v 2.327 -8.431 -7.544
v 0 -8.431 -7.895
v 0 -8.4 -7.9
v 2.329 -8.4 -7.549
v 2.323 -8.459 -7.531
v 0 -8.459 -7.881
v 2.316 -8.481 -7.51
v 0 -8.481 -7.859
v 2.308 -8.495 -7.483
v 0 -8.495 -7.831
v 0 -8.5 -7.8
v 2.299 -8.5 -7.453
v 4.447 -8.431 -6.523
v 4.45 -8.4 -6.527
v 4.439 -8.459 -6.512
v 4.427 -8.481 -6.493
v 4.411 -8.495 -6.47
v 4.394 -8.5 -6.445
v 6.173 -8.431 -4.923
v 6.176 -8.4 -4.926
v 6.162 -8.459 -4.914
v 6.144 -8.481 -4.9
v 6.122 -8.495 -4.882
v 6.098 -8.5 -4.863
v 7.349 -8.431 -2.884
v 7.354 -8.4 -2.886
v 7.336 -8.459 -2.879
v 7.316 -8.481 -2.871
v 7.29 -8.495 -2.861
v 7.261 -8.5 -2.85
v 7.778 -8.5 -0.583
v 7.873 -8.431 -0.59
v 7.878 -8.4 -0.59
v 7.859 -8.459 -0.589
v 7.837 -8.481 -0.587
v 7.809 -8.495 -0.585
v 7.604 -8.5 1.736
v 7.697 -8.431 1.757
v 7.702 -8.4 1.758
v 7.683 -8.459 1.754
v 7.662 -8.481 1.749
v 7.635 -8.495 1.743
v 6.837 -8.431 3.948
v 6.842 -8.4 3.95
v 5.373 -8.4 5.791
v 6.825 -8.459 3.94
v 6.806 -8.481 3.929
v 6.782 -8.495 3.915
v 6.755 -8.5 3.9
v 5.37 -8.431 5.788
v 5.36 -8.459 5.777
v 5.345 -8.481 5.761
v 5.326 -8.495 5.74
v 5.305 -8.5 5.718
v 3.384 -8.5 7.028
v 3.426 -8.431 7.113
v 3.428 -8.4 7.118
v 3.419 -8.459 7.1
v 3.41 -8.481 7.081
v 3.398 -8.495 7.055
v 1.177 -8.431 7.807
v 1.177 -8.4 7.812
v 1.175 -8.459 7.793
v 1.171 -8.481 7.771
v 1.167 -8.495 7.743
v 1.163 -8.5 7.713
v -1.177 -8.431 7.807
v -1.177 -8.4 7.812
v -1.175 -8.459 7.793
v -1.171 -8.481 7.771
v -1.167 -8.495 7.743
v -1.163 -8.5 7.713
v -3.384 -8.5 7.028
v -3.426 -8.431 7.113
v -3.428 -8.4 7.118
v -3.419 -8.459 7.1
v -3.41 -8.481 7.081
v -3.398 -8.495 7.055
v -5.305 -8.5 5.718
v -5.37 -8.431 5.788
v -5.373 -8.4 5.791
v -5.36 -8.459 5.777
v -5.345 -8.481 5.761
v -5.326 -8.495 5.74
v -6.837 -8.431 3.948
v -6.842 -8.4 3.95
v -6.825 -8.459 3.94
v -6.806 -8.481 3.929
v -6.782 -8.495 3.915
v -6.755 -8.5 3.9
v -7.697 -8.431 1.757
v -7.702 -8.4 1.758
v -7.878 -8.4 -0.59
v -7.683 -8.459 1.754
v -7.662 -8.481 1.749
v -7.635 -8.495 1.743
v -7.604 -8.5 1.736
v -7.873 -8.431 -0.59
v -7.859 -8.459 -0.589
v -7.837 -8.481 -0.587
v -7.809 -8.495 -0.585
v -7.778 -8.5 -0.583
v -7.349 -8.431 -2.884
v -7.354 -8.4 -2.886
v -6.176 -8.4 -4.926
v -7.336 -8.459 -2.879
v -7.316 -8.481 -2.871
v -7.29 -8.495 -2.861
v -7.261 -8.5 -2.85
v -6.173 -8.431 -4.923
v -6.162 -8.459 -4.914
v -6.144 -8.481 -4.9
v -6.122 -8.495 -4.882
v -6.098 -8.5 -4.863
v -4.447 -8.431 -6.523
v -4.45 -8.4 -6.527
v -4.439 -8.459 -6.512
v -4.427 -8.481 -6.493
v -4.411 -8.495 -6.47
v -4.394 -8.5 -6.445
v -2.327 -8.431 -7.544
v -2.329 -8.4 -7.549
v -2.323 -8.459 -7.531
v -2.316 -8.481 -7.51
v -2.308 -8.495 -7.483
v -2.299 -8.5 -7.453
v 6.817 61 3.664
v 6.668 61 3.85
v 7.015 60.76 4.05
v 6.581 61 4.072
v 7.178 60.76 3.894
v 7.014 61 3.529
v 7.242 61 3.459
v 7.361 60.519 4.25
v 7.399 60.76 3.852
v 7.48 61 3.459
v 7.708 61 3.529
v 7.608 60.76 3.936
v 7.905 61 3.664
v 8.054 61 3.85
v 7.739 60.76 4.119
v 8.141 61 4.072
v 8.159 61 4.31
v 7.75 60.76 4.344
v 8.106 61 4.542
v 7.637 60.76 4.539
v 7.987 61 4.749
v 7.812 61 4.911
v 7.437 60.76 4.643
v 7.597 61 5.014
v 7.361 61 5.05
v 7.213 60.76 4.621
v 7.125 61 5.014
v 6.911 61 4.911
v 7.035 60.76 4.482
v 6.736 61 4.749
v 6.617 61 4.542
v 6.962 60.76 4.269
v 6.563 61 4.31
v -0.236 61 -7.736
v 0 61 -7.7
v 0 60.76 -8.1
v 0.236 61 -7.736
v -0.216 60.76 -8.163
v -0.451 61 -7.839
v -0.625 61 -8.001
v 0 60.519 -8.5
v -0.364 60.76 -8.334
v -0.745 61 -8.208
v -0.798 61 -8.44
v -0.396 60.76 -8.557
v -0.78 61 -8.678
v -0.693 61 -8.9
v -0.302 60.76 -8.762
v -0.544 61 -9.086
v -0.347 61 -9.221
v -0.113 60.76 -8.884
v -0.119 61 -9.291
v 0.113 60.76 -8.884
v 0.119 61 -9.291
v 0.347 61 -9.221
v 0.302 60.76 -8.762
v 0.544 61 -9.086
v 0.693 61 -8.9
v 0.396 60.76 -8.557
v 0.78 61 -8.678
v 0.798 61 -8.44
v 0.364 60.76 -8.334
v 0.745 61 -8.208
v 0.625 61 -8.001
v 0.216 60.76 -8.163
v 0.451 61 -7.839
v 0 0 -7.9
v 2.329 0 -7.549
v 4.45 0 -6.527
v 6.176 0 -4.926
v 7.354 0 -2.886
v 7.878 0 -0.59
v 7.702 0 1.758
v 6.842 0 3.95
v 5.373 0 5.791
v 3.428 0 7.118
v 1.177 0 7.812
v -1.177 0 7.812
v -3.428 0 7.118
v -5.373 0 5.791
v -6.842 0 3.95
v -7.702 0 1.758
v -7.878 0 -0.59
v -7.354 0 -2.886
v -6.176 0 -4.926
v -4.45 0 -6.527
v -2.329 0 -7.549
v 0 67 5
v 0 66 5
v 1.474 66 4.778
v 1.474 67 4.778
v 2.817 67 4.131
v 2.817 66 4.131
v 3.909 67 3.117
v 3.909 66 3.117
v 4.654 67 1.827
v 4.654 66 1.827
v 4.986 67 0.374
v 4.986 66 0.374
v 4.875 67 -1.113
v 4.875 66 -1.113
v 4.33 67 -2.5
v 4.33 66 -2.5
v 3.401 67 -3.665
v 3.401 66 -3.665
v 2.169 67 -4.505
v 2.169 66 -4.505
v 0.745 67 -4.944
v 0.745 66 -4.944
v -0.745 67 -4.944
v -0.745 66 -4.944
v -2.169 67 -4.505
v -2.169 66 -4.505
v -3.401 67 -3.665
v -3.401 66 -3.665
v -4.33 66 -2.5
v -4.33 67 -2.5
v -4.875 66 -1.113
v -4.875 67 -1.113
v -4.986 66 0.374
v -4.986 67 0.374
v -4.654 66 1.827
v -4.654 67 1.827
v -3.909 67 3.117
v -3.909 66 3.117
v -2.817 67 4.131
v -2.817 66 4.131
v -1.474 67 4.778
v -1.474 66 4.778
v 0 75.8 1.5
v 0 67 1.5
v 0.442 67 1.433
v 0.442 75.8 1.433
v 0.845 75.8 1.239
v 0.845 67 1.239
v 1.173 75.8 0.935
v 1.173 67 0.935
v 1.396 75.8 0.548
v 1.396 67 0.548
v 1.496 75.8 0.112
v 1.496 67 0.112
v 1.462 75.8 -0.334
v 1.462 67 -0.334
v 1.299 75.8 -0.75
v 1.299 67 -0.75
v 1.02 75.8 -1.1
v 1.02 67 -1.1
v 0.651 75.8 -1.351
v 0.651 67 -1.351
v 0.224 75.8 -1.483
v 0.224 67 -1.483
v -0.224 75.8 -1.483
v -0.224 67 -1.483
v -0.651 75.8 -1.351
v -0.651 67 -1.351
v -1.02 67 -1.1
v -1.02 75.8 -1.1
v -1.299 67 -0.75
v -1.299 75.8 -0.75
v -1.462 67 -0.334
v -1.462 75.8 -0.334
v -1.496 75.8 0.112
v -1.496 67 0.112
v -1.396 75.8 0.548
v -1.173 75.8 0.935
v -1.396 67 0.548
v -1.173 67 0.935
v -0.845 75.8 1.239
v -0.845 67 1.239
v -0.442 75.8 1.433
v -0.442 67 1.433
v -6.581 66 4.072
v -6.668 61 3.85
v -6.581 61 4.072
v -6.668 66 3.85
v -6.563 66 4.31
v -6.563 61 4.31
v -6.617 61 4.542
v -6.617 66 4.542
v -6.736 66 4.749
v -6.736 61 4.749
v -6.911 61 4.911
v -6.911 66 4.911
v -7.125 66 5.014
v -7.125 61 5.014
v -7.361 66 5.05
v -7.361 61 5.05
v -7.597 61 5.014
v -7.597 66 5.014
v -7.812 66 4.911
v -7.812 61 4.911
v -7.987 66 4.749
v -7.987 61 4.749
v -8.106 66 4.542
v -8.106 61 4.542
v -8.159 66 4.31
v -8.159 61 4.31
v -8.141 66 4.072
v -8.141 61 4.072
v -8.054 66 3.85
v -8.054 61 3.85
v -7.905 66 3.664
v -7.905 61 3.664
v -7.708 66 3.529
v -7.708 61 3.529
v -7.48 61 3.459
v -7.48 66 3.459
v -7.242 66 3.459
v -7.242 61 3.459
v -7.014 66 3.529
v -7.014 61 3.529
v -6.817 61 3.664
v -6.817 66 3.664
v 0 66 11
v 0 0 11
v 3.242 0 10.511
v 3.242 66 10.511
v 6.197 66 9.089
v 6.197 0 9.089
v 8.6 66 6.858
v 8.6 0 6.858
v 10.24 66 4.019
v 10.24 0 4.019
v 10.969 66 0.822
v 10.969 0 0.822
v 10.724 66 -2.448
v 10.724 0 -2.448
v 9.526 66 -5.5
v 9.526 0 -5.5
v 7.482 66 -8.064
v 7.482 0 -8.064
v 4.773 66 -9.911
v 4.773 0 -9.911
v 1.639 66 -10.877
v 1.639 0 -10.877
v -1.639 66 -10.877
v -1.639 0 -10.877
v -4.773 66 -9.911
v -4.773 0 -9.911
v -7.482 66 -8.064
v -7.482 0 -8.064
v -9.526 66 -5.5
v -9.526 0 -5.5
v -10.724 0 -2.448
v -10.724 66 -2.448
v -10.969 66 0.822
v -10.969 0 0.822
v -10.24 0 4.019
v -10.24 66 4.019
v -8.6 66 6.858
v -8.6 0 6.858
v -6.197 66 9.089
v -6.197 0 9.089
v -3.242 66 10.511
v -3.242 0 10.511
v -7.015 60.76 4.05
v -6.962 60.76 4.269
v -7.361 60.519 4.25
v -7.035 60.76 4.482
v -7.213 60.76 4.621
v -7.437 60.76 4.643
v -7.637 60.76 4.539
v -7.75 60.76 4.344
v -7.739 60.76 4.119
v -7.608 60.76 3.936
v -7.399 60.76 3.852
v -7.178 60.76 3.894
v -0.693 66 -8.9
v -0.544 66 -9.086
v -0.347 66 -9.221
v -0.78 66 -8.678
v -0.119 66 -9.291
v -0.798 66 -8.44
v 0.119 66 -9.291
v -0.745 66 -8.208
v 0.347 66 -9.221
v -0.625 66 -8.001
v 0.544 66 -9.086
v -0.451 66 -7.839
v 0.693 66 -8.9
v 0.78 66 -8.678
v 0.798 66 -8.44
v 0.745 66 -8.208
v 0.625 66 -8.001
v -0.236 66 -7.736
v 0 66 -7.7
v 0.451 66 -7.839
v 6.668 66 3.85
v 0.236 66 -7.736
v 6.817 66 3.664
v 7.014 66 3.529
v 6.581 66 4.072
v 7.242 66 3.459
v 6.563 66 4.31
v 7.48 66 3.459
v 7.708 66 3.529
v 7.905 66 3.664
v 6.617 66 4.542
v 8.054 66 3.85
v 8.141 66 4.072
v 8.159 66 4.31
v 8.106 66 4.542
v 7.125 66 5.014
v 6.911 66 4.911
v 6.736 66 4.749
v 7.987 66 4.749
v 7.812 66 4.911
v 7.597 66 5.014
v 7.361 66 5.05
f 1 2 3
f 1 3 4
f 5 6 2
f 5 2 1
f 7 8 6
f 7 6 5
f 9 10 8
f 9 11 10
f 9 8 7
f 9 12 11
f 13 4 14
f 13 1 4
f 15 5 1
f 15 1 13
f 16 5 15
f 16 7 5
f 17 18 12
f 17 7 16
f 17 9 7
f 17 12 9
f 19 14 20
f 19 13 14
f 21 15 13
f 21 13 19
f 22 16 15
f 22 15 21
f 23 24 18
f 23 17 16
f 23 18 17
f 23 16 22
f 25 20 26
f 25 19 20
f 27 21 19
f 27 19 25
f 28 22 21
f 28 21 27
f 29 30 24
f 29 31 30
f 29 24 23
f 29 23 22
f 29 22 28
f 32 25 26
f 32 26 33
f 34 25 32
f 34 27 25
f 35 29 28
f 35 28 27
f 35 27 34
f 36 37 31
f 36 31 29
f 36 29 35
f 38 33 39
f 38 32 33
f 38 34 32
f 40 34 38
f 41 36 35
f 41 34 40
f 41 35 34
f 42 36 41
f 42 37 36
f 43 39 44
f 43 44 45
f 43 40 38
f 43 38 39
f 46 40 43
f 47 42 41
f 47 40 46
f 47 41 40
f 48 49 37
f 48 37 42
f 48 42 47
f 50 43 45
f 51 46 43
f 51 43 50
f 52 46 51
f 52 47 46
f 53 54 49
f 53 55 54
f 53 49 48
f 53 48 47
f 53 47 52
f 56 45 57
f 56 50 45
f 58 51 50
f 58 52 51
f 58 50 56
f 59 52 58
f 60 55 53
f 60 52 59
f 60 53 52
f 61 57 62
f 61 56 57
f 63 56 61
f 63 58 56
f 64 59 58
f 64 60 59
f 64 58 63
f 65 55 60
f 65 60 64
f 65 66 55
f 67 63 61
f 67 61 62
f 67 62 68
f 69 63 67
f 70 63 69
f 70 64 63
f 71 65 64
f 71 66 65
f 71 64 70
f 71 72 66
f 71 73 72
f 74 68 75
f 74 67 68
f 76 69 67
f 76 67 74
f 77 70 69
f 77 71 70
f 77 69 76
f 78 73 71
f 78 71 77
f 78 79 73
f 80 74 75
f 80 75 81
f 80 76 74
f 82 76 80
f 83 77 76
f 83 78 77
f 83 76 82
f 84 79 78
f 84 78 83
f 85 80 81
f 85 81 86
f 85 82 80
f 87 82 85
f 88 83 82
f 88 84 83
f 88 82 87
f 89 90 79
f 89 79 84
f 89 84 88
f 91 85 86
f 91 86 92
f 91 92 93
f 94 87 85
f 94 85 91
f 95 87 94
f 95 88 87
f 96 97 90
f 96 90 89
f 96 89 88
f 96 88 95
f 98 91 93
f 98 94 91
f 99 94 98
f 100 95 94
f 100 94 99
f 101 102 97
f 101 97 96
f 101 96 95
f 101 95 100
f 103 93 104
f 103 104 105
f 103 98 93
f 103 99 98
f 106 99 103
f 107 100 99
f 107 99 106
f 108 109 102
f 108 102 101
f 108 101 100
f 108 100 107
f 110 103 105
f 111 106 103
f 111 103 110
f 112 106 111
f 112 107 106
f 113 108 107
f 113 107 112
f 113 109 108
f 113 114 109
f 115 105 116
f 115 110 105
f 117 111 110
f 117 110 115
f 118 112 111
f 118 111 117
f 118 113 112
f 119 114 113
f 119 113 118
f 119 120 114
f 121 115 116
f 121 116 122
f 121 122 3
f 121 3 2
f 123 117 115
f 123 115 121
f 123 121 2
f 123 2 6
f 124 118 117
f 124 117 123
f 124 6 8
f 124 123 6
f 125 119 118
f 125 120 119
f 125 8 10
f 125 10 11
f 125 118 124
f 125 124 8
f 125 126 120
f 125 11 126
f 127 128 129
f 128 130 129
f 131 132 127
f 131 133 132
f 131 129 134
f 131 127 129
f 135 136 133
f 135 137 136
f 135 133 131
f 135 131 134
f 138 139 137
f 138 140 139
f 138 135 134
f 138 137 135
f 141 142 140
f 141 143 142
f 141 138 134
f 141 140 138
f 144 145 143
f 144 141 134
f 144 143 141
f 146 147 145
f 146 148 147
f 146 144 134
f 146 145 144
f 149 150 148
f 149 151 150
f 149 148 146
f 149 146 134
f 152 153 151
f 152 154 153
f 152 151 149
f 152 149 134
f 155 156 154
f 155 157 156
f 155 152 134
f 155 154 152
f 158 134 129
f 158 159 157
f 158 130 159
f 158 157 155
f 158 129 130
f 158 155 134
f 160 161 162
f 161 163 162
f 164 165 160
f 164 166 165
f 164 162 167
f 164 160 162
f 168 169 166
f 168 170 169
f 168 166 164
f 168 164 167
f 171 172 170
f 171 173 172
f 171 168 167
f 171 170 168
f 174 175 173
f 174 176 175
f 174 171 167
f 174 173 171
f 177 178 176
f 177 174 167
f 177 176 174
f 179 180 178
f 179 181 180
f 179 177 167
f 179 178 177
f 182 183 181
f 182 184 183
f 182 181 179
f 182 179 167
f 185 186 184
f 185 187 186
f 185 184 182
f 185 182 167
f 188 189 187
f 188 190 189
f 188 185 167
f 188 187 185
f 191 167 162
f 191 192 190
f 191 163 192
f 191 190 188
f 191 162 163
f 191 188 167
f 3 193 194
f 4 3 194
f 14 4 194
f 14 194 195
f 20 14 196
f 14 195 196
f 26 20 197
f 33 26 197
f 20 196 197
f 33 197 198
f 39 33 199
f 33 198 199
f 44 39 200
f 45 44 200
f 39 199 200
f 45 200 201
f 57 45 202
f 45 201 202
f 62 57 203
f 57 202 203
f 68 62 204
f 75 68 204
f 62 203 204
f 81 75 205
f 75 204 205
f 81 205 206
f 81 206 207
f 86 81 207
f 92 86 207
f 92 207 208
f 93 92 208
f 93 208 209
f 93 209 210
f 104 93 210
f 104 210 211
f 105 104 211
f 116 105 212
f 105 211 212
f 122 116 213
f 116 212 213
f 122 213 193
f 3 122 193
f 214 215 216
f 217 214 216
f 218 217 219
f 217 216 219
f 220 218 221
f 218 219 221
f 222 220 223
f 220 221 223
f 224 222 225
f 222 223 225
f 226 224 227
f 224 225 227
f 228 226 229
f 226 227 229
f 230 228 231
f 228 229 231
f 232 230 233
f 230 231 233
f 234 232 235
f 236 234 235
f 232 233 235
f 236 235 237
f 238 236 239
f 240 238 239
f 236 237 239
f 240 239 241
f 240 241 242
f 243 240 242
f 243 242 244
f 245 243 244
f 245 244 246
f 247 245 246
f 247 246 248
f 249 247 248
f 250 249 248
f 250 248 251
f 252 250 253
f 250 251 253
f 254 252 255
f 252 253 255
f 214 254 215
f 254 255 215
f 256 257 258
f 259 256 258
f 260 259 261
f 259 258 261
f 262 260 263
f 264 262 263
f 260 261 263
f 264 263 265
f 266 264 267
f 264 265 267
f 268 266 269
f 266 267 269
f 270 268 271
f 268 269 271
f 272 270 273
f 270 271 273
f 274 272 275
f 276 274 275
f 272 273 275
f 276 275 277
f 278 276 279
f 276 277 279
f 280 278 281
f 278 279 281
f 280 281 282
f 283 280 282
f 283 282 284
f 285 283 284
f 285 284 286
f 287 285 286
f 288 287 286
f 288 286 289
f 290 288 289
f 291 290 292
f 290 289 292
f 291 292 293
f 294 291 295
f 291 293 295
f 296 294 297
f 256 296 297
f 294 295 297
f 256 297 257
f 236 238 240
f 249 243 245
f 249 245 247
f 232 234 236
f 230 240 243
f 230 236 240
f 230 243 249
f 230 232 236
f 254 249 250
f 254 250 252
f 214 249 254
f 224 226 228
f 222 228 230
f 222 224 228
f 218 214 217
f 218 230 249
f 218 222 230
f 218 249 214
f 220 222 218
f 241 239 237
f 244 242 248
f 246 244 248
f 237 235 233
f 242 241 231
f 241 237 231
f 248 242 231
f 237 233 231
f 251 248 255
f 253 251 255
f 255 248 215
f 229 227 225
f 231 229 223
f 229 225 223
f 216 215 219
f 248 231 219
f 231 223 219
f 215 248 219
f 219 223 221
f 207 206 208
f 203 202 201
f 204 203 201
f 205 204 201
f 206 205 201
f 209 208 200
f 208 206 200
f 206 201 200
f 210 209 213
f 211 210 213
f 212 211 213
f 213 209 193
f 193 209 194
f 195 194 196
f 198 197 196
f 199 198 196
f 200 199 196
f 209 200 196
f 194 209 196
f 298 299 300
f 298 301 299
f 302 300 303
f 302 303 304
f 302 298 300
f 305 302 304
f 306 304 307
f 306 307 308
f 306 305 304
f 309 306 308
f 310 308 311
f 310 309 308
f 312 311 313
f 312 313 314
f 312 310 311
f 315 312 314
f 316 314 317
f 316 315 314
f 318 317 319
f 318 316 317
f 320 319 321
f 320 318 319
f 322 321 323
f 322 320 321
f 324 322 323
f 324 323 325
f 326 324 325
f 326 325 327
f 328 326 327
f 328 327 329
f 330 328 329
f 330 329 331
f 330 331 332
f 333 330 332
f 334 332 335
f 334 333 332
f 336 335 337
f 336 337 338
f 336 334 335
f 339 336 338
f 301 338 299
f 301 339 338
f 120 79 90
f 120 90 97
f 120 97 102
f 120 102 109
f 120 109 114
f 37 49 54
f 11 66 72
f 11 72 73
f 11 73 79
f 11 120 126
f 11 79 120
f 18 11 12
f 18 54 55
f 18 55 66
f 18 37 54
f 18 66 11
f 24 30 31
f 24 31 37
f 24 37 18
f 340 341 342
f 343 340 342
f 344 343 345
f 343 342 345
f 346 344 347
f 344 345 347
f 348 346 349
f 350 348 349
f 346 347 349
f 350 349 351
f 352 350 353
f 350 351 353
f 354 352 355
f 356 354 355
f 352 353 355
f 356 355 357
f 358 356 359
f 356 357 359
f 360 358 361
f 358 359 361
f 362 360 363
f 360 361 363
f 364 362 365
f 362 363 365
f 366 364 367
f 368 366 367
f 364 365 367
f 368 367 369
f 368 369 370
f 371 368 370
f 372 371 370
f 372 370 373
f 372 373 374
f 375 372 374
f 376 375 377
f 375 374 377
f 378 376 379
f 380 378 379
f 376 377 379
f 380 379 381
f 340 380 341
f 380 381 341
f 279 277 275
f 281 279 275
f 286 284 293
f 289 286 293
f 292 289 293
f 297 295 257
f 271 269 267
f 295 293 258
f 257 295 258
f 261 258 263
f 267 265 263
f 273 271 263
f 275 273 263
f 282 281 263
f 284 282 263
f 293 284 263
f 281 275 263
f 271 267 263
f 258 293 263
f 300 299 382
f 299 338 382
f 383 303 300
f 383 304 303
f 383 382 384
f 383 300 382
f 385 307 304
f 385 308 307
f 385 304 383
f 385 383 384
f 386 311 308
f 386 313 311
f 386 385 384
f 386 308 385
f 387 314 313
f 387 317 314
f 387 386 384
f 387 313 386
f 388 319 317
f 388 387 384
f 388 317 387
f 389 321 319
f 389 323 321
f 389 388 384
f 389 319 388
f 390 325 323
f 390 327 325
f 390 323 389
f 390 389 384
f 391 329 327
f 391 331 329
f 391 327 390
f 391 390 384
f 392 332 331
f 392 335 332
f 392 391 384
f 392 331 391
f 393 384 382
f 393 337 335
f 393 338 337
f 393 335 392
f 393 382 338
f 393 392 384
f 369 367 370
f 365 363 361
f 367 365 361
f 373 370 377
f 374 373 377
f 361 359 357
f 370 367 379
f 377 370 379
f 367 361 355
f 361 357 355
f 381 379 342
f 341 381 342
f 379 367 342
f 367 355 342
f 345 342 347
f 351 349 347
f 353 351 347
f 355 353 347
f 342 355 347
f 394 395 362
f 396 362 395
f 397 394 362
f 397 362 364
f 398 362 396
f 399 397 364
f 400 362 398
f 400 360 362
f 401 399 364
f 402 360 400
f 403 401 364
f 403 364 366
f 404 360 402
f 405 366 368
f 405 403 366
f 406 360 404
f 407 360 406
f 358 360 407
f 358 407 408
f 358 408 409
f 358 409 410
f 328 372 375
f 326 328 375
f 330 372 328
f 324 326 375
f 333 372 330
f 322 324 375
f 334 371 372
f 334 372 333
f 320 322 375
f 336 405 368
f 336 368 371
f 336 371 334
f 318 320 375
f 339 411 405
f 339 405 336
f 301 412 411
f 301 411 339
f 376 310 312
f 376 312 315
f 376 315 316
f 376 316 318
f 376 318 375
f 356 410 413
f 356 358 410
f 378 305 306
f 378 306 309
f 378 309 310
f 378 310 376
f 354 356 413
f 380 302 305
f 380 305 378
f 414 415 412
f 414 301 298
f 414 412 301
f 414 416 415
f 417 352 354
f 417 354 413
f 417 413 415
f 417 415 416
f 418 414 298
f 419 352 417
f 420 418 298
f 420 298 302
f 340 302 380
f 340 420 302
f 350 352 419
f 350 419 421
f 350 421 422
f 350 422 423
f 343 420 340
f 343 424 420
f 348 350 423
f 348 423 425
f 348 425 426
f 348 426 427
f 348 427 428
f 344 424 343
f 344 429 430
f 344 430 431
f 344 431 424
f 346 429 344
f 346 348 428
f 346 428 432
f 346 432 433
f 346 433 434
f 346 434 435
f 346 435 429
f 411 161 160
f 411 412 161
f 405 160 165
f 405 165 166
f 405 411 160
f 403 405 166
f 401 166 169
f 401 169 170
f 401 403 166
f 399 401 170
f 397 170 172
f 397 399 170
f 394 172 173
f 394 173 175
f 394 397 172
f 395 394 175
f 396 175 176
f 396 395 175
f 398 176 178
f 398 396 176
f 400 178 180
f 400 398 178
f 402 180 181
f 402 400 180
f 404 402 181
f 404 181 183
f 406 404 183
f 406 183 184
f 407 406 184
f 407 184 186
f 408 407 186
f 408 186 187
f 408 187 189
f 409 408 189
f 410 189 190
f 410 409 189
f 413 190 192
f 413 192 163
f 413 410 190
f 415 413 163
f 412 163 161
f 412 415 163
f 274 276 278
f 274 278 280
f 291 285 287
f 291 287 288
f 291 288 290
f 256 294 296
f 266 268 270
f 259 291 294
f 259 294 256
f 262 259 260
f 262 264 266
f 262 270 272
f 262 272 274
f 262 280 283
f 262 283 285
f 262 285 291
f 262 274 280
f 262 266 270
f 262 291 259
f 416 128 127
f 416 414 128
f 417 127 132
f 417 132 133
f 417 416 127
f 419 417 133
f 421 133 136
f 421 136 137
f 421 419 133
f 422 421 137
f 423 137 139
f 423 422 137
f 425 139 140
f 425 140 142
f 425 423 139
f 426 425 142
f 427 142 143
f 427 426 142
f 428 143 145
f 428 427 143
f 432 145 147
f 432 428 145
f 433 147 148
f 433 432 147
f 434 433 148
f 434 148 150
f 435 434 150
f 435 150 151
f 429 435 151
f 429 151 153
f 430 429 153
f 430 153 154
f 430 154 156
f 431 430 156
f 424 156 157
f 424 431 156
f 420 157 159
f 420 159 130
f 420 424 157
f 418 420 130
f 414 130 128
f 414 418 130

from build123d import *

# Parameters (mm, degrees)
SKETCH_1_R               = 11
EXTRUDE_1_DEPTH          = 66
SKETCH_2_R               = 5
EXTRUDE_2_DEPTH          = 1
SKETCH_3_R               = 1.5
EXTRUDE_3_DEPTH          = 8.8
SKETCH_4_R               = 7.9
EXTRUDE_4_DEPTH          = 8.5
FILLET_2_R               = 0.1
PATTERN_CIRCULAR_2_COUNT = 3


with BuildPart() as part:
    # 스케치1 → 보스-돌출1 (new body)
    with BuildSketch(Plane(origin=(0, 0, 0), x_dir=(1, 0, 0), z_dir=(0, 1, 0))):
        with Locations(Location((0, 0, 0), (0, 0, 270))):
            Circle(SKETCH_1_R)
    extrude(amount=EXTRUDE_1_DEPTH)

    # 스케치8 → M2 나사 구멍1 (revolve, cut)
    with BuildSketch(Plane(origin=(0, 66, -8.5), x_dir=(0, 0, 1), z_dir=(1, 0, 0))):
        Polygon((0, 0), (0, 5.480688495), (0.8, 5), (0.8, 0), align=None)
    hole_wizard_m2_1 = revolve(axis=Axis((0, 72.35, -8.5), (0, -1, 0)), mode=Mode.SUBTRACT)

    # 원형 패턴2: M2 나사 구멍1 ×3 about axis
    pattern_circular_2_axis = Axis((0, 0, 0), (0, 1, 0))
    for i in range(1, PATTERN_CIRCULAR_2_COUNT):
        add(hole_wizard_m2_1.rotate(pattern_circular_2_axis, i * 360 / PATTERN_CIRCULAR_2_COUNT), mode=Mode.SUBTRACT)


with BuildPart() as body_2:
    # 스케치2 → 보스-돌출2 (new body)
    with BuildSketch(Plane(origin=(0, 66, 0), x_dir=(1, 0, 0), z_dir=(0, 1, 0))):
        with Locations(Location((0, 0, 0), (0, 0, 270))):
            Circle(SKETCH_2_R)
    extrude(amount=EXTRUDE_2_DEPTH)


with BuildPart() as body_3:
    # 스케치3 → 보스-돌출3 (new body)
    with BuildSketch(Plane(origin=(0, 67, 0), x_dir=(1, 0, 0), z_dir=(0, 1, 0))):
        with Locations(Location((0, 0, 0), (0, 0, 270))):
            Circle(SKETCH_3_R)
    extrude(amount=EXTRUDE_3_DEPTH)


with BuildPart() as body_4:
    # 스케치4 → 보스-돌출4 (new body)
    with BuildSketch(Plane.XZ):
        with Locations(Location((0, 0, 0), (0, 0, 270))):
            Circle(SKETCH_4_R)
    extrude(amount=EXTRUDE_4_DEPTH)

    # 필렛2
    fillet_2_edges = [body_4.edges().sort_by_distance(p)[0] for p in [
        (0, -8.5, 7.9),
    ]]
    fillet(fillet_2_edges, radius=FILLET_2_R)


solid = Compound([part.part, body_2.part, body_3.part, body_4.part])
